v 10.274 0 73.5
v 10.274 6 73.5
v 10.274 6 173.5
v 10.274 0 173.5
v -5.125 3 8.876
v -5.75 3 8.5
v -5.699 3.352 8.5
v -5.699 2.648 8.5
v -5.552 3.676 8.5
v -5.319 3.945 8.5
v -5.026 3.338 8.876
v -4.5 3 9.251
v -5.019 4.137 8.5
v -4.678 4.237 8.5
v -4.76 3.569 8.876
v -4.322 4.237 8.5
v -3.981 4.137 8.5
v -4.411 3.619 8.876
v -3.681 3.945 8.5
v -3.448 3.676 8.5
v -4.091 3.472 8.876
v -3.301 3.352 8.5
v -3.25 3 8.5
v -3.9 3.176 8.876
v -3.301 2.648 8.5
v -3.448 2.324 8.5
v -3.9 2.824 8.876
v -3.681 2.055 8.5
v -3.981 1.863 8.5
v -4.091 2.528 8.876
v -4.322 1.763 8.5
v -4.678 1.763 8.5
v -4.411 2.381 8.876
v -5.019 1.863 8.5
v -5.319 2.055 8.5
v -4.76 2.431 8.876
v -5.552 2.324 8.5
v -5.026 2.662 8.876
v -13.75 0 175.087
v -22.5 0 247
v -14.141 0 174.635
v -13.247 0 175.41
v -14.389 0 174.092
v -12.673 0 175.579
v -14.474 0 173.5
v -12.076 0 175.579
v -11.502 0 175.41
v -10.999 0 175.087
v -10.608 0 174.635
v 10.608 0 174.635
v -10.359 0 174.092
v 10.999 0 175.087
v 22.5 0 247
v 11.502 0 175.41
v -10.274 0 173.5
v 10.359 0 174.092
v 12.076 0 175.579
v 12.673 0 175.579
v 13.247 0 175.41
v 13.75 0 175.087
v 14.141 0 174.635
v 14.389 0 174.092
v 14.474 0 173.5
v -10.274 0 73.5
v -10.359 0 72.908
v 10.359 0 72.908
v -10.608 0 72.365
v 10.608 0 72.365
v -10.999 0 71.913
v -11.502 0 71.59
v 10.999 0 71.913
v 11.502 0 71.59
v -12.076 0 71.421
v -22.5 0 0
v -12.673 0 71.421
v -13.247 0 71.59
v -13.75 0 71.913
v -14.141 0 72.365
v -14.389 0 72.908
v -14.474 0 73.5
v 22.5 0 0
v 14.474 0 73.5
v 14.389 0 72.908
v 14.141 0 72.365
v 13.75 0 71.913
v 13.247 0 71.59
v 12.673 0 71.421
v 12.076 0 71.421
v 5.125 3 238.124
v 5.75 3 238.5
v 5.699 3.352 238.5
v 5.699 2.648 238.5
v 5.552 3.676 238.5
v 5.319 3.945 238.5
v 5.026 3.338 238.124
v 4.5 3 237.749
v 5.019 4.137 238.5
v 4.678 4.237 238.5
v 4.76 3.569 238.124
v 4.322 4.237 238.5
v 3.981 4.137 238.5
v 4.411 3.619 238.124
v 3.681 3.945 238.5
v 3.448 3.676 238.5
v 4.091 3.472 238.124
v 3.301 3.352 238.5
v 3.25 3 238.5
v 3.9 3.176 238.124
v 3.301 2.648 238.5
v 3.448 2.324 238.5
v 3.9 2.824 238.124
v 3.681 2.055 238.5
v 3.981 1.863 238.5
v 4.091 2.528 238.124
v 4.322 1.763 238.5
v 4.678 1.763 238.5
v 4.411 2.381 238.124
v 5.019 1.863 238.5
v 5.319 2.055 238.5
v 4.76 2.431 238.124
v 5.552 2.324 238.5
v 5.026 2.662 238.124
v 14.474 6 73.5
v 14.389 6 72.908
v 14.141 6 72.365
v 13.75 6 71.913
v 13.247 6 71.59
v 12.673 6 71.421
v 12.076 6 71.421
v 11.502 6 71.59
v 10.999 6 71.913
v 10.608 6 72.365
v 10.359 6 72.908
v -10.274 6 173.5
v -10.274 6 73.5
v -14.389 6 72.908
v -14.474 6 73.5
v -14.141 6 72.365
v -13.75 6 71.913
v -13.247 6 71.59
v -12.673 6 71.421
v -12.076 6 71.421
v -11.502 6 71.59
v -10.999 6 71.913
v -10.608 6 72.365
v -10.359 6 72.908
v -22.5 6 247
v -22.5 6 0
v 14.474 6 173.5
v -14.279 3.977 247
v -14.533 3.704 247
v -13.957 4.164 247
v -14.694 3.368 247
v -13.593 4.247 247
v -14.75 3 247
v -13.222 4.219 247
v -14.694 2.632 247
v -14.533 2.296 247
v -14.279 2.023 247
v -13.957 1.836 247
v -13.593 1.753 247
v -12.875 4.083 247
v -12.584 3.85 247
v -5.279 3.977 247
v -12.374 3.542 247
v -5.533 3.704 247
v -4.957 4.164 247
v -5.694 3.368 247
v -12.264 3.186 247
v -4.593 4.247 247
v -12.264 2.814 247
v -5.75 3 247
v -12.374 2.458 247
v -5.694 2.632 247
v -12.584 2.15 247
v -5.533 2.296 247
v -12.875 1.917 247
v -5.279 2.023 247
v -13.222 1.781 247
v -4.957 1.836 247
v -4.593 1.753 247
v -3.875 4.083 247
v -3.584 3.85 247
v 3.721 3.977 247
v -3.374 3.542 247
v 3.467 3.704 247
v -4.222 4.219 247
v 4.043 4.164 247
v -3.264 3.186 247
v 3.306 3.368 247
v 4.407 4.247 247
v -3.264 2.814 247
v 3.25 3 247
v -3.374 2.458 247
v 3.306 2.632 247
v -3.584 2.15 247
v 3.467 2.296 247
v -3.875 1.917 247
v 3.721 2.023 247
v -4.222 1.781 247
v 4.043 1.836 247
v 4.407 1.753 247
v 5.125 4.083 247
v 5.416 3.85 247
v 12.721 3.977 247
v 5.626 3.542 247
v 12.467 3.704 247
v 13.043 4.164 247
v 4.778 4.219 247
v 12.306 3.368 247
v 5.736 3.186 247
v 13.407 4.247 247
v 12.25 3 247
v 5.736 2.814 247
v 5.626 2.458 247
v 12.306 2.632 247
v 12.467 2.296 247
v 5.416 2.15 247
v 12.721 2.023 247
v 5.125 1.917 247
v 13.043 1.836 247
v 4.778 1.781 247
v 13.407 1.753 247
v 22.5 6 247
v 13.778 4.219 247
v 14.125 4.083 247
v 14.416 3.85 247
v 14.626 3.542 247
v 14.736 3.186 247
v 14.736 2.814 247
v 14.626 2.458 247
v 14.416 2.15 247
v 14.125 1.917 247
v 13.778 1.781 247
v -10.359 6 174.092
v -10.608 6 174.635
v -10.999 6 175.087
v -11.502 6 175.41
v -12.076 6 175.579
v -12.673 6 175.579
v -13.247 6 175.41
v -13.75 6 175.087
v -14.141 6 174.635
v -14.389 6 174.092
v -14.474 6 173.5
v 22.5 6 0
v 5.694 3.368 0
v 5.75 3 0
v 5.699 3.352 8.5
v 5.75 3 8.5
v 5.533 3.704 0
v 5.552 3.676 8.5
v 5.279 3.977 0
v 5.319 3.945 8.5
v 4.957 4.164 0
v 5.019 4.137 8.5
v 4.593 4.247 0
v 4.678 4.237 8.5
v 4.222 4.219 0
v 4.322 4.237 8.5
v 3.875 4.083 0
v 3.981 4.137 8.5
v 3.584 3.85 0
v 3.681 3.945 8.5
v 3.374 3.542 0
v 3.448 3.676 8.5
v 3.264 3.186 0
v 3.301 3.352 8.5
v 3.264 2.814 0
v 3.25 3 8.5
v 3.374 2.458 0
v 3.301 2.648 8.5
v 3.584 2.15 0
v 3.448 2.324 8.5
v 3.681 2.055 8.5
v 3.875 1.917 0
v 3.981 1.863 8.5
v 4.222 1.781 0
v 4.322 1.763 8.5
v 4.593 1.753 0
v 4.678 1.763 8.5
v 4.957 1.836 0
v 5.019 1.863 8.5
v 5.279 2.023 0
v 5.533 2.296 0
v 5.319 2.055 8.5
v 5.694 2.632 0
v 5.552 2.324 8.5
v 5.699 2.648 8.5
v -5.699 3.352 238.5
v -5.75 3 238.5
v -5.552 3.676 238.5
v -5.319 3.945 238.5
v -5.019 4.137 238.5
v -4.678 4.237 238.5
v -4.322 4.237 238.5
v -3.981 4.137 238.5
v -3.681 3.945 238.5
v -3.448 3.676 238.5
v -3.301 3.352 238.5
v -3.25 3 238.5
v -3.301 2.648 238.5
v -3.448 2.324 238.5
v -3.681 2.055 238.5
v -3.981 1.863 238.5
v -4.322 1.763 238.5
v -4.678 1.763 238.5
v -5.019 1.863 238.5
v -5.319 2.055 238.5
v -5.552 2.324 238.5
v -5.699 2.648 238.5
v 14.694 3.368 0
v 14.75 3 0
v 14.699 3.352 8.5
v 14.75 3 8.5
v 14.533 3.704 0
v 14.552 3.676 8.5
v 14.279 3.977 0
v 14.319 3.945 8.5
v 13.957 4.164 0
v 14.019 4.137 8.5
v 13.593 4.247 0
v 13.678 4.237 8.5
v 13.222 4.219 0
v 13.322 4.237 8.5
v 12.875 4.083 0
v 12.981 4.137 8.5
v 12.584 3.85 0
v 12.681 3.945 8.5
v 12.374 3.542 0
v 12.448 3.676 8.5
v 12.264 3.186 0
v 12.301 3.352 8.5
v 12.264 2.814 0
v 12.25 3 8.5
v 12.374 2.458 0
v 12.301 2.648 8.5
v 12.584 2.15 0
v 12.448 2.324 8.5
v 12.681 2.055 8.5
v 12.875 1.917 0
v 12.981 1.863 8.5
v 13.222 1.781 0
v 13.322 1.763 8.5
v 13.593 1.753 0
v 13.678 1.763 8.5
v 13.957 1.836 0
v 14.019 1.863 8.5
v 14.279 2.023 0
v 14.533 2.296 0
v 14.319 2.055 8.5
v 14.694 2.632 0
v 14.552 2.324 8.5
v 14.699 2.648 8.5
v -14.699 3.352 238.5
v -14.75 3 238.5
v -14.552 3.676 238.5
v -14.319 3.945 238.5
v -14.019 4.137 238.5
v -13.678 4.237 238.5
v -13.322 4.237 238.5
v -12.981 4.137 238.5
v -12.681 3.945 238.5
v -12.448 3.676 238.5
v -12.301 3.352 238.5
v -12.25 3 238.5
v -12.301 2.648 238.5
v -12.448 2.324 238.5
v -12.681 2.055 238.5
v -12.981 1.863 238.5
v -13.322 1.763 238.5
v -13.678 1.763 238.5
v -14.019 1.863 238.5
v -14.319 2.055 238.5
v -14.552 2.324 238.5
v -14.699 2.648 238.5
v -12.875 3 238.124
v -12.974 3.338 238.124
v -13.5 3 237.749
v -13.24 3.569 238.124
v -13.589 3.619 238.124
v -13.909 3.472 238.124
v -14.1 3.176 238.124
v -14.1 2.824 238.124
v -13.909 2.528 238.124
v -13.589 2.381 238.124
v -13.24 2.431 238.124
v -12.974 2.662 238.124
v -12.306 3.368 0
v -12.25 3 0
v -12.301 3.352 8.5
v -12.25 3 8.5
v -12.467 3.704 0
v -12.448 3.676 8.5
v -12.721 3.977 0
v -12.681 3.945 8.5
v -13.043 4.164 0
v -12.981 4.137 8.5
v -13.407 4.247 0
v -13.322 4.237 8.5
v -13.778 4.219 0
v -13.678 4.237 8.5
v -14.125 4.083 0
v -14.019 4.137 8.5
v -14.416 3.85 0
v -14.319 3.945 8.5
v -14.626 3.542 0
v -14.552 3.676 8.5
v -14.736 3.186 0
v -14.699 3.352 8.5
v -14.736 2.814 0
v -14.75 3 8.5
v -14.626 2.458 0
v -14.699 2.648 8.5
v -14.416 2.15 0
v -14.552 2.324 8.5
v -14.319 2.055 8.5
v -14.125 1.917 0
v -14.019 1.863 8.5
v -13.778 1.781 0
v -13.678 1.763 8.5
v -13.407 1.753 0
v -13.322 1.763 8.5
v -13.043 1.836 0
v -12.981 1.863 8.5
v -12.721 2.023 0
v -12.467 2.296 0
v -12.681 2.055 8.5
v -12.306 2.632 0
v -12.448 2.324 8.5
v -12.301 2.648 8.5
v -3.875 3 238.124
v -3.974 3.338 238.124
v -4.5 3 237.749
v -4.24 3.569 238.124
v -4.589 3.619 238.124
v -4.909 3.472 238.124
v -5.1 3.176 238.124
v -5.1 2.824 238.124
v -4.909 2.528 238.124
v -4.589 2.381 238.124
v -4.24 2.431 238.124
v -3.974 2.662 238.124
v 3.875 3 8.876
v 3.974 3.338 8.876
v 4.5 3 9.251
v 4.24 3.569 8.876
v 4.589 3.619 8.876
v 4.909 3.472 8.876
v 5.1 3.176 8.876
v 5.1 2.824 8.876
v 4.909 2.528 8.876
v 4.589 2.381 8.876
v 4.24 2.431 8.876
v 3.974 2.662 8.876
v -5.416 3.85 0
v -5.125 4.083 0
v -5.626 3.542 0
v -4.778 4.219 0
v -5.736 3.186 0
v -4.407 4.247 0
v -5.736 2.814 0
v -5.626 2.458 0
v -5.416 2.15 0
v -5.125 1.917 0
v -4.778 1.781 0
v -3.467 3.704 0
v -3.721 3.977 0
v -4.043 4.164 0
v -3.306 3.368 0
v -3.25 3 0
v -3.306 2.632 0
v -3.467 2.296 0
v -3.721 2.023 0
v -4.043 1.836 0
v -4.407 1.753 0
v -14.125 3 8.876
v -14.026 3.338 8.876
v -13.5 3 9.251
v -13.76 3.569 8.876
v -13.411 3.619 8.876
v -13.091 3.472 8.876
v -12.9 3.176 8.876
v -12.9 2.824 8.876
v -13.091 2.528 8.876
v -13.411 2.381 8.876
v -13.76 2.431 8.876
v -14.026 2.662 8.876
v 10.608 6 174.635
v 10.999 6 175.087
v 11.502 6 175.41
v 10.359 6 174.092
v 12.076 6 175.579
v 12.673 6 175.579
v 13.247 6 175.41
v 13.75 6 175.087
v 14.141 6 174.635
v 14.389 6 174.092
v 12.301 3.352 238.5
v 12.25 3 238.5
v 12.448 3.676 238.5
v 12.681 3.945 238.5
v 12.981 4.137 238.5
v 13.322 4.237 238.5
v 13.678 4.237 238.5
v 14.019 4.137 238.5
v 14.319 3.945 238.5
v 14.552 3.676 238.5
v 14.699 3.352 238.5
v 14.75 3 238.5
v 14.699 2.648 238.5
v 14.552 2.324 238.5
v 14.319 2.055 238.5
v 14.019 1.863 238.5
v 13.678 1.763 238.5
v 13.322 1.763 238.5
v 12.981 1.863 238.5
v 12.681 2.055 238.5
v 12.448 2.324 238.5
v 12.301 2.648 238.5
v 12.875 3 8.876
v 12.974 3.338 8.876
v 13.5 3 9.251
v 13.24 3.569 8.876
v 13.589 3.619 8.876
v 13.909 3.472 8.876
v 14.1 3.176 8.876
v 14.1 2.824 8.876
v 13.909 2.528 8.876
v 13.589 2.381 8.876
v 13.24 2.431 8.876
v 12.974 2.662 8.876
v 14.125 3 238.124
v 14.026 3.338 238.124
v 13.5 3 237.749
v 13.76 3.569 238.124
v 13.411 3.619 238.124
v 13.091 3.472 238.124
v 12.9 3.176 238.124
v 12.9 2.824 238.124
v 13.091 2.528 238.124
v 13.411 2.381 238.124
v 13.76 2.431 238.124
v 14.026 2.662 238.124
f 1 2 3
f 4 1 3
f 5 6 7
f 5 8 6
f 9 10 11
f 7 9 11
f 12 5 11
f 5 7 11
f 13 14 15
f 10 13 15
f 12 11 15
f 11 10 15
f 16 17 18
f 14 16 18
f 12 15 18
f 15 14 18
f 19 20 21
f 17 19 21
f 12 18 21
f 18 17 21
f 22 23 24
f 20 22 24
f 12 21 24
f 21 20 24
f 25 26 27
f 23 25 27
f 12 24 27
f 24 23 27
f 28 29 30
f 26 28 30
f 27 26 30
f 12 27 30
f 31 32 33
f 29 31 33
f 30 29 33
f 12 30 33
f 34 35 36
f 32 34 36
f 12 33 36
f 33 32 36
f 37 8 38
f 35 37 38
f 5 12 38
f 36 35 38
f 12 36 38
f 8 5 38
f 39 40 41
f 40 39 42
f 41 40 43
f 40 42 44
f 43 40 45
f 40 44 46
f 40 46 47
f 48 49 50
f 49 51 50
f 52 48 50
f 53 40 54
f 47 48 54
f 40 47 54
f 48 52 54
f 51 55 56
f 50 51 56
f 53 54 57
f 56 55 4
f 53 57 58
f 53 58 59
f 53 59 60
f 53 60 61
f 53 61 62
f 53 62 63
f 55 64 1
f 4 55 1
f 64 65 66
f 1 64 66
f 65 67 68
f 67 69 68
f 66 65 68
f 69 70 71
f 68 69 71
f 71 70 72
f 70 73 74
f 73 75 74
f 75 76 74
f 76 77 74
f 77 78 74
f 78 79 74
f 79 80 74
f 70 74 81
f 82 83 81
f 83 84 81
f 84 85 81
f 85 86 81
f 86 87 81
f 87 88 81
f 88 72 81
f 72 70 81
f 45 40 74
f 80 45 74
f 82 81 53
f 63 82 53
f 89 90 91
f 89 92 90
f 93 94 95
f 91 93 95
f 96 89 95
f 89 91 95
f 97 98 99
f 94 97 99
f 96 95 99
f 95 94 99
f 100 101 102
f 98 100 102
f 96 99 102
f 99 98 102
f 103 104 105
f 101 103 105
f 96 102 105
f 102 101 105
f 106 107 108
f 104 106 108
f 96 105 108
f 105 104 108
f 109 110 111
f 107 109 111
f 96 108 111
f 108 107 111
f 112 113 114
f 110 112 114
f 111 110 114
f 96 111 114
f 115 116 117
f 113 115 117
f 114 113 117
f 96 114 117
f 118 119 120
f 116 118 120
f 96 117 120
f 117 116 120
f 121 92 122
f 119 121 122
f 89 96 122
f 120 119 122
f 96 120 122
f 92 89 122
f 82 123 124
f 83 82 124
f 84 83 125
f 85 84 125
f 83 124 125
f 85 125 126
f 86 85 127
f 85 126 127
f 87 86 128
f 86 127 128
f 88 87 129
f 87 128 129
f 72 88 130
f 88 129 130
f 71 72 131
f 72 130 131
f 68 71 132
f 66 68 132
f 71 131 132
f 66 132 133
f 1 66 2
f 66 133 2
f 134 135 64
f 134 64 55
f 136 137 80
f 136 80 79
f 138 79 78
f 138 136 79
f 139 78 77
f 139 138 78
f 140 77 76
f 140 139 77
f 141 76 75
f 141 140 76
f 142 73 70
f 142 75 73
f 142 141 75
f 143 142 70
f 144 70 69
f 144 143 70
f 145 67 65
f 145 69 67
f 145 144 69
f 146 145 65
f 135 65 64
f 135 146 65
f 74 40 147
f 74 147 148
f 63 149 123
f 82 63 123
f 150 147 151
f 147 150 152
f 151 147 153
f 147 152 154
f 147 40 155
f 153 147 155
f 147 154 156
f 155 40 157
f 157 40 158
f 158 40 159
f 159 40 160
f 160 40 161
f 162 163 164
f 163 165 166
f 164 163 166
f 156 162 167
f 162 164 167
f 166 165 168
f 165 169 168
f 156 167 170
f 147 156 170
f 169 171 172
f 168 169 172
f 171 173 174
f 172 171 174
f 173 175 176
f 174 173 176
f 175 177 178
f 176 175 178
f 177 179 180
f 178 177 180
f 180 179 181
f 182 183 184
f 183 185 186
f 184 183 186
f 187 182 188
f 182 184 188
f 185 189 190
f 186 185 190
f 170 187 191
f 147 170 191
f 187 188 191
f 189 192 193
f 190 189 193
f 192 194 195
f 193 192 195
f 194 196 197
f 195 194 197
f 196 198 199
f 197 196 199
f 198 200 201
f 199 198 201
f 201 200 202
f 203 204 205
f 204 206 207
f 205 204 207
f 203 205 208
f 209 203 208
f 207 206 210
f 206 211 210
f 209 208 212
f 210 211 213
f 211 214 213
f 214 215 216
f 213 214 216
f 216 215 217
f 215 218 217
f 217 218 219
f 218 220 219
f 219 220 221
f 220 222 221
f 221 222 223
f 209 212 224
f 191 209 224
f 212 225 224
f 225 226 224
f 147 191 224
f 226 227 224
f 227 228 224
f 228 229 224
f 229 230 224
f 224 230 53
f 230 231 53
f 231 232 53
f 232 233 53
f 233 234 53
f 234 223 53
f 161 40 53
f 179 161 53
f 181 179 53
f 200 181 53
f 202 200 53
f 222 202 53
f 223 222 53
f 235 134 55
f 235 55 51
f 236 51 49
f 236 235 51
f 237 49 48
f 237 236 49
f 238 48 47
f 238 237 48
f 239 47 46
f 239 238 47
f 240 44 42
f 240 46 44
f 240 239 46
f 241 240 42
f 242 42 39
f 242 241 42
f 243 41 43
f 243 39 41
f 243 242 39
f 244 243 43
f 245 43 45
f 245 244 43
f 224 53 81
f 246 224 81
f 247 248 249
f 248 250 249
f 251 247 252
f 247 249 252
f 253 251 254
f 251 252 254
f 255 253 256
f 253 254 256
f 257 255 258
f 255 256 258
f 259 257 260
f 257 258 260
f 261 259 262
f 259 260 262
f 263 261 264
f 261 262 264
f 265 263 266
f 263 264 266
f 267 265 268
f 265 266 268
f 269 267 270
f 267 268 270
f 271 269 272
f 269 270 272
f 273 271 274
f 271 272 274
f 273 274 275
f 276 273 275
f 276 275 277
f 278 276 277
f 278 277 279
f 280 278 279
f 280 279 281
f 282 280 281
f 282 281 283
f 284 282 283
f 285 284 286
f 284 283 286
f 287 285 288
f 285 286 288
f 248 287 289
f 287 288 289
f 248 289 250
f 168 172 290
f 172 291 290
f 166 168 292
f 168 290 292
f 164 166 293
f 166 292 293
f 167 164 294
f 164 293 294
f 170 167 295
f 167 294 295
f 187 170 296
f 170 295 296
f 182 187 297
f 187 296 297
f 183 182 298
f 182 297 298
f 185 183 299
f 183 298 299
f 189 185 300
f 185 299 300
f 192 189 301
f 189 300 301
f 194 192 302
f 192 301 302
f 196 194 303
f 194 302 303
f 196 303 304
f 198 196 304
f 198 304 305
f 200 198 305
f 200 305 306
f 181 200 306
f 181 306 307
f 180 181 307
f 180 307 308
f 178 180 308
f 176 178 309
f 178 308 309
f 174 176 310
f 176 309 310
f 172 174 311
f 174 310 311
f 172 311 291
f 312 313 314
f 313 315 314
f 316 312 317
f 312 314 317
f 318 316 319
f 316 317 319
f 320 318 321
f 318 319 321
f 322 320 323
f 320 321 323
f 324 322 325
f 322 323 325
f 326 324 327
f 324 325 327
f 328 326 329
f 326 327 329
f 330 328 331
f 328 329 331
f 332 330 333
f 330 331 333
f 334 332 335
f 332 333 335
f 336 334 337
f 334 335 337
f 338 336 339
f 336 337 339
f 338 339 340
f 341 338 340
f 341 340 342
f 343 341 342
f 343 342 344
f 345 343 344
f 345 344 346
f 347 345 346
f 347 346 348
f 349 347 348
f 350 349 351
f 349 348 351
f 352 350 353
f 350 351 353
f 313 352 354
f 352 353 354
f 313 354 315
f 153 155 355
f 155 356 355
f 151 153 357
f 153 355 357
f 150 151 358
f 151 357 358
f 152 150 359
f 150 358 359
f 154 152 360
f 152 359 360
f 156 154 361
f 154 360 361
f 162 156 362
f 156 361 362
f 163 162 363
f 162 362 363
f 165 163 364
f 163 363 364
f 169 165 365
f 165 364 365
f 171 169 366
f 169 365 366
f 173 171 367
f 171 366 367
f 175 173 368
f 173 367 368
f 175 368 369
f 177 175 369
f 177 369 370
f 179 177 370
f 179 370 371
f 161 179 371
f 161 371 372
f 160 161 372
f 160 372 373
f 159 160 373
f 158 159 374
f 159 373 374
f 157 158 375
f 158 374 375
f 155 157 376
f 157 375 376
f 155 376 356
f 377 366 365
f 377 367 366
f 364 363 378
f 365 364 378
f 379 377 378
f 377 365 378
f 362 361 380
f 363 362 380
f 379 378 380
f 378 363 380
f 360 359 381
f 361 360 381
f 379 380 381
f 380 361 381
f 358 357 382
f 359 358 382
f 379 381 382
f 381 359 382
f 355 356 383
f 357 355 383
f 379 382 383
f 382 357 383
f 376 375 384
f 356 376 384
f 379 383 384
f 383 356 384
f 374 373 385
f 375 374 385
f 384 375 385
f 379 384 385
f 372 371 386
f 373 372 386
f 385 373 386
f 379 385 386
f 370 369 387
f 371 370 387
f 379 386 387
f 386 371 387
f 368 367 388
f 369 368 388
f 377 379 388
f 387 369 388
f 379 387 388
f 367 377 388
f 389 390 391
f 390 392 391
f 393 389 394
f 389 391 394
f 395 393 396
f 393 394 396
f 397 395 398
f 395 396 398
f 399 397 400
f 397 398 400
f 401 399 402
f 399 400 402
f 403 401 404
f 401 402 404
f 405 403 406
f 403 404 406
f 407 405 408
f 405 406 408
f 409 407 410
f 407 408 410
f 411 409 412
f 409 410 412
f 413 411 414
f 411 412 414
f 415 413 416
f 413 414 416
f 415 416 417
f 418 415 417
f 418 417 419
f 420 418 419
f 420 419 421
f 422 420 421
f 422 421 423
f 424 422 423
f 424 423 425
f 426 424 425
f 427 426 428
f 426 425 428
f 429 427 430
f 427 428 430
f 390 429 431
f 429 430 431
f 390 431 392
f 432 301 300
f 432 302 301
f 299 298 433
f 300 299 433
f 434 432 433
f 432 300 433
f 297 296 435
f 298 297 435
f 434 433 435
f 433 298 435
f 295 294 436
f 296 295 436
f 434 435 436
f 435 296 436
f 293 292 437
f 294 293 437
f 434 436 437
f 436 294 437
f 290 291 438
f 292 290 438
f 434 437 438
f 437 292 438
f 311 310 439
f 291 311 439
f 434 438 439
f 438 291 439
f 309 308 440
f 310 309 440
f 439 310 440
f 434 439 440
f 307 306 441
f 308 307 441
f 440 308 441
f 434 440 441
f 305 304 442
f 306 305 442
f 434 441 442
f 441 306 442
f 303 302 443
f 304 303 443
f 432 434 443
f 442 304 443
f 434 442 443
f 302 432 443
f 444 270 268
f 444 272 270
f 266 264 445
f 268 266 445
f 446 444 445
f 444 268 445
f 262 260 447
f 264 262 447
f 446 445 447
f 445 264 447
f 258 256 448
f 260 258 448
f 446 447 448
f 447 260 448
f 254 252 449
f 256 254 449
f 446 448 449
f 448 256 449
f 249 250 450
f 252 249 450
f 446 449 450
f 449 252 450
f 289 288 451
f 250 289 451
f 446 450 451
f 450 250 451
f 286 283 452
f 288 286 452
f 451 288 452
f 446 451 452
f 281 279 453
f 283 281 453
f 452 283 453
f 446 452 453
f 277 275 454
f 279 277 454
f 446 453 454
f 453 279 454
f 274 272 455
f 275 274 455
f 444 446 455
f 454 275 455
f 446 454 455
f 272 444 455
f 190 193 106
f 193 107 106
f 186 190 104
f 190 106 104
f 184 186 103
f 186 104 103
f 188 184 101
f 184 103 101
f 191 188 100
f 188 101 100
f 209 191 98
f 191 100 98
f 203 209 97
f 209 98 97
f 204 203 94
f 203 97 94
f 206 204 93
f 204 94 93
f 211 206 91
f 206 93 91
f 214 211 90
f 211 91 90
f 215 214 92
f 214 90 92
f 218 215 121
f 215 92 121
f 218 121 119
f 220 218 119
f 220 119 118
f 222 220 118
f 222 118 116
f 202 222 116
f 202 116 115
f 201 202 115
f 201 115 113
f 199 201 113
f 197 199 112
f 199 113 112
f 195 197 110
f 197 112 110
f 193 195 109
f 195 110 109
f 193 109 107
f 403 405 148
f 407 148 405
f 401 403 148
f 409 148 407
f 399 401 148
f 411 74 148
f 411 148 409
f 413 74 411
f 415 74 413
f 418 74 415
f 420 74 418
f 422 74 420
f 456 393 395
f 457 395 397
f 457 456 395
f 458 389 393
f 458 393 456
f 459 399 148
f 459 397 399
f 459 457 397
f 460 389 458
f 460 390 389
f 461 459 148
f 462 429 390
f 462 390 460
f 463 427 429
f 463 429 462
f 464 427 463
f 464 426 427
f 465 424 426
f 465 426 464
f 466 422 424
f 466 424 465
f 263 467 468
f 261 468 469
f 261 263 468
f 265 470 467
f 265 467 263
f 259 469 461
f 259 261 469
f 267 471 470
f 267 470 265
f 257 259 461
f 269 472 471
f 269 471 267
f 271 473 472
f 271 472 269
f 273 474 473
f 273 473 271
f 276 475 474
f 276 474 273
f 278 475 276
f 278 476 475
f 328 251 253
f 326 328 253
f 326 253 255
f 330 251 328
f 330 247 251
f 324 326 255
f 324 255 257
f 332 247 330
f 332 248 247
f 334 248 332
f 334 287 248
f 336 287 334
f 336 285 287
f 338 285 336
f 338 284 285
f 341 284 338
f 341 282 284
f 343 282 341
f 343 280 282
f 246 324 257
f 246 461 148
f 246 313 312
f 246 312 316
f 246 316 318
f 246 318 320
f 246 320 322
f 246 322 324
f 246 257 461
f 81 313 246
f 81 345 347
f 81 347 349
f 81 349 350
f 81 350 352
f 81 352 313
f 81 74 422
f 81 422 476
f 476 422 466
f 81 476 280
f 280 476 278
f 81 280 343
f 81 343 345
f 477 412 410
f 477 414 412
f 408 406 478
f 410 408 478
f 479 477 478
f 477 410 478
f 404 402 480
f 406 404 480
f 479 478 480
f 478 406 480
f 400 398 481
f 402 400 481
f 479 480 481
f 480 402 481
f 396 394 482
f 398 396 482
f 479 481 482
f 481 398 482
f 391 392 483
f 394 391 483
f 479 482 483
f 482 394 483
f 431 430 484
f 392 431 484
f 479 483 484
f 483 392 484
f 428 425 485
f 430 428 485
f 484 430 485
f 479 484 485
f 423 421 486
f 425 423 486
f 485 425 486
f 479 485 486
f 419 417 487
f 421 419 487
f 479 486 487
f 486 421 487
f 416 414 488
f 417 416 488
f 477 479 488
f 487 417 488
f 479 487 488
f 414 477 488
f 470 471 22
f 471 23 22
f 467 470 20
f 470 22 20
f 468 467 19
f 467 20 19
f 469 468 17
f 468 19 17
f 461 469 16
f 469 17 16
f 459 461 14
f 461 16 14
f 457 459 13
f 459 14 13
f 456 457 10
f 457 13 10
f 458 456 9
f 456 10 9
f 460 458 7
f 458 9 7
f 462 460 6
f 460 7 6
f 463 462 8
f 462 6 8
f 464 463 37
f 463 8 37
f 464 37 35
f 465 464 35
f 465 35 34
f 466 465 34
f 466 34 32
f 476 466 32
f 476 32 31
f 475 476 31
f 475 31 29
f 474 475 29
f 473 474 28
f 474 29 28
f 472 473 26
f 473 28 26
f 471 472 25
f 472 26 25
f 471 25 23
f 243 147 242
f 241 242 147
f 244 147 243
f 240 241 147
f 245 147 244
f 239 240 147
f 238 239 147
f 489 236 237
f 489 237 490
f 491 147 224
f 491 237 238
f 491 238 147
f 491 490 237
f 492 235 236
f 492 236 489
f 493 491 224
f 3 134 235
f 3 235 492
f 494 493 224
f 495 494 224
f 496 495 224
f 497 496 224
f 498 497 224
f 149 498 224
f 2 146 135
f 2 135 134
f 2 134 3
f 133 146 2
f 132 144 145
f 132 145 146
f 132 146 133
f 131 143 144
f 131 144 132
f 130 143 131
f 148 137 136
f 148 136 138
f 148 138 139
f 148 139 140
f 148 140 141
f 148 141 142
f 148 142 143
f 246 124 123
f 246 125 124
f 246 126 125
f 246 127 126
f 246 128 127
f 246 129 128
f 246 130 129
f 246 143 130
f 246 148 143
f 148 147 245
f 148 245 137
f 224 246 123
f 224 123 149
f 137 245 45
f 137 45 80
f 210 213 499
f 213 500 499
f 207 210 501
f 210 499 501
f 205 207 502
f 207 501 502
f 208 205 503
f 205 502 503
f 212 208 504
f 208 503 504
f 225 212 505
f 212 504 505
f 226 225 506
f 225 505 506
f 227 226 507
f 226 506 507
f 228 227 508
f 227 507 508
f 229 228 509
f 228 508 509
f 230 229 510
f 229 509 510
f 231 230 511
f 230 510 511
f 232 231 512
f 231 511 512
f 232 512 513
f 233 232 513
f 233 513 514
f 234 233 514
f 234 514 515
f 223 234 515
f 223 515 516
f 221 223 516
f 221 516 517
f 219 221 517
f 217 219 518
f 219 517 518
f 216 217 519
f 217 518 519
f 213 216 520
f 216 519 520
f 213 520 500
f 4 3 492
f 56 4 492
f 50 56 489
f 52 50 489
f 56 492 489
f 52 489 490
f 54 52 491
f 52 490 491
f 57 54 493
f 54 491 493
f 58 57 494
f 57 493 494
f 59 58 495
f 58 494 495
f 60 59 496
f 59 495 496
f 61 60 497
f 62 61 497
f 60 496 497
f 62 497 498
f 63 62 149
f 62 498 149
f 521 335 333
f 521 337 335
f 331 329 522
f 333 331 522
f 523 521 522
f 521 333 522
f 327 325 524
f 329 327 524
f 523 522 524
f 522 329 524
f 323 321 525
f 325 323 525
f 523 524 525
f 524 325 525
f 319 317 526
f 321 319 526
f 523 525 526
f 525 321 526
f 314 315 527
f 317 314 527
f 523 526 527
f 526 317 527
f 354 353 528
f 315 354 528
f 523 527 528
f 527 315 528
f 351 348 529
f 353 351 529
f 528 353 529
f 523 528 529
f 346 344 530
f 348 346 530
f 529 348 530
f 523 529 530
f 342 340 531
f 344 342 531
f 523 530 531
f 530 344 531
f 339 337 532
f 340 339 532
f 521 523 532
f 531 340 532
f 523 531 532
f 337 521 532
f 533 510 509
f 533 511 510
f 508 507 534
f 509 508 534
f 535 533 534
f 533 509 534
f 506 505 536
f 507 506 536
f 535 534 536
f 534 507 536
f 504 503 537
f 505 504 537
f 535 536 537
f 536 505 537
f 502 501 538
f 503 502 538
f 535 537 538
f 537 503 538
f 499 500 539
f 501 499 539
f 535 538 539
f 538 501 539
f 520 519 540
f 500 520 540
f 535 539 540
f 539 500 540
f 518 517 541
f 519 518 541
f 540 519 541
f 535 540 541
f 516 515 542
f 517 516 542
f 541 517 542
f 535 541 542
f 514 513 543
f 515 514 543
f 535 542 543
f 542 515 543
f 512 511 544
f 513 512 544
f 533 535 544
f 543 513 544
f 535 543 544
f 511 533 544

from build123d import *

# Parameters (mm, degrees)
SKETCH_1_W          = 45
SKETCH_1_H          = 247
EXTRUDE_1_DEPTH     = 6
CUT_EXTRUDE_1_DEPTH = 249.095243808
M3X0_51_D           = 2.5
M3X0_51_DEPTH       = 8.5
M3X0_51_TIP         = 0.751075774
M3X0_52_D           = 2.5
M3X0_52_DEPTH       = 8.5
M3X0_52_TIP         = 0.751075774


with BuildPart() as part:
    # Эскиз1 → Бобышка-Вытянуть1 (new body)
    with BuildSketch(Plane(origin=(0, 0, 0), x_dir=(1, 0, 0), z_dir=(0, 1, 0))):
        with Locations((0, -123.5)):
            Rectangle(SKETCH_1_W, SKETCH_1_H)
    extrude(amount=EXTRUDE_1_DEPTH)

    # Эскиз2 → Вырез-Вытянуть1 (cut, through all)
    with BuildSketch(Plane(origin=(0, 6, 0), x_dir=(1, 0, 0), z_dir=(0, 1, 0))):
        with BuildLine():
            Line((-10.274368671, -73.5), (-10.274368671, -173.5))
            ThreePointArc((-10.274368671, -173.5), (-12.374368671, -175.6), (-14.474368671, -173.5))
            Line((-14.474368671, -173.5), (-14.474368671, -73.5))
            ThreePointArc((-14.474368671, -73.5), (-12.374368671, -71.4), (-10.274368671, -73.5))
        make_face()
        with BuildLine():
            Line((10.274368671, -73.5), (10.274368671, -173.5))
            ThreePointArc((10.274368671, -173.5), (12.374368671, -175.6), (14.474368671, -173.5))
            Line((14.474368671, -173.5), (14.474368671, -73.5))
            ThreePointArc((14.474368671, -73.5), (12.374368671, -71.4), (10.274368671, -73.5))
        make_face()
    extrude(amount=-CUT_EXTRUDE_1_DEPTH, mode=Mode.SUBTRACT)

    # Отверстие обработанное метчиком M3x0.51
    with Locations(Plane.XY.offset(247)):
        with Locations((-13.5, 3), (-4.5, 3), (4.5, 3), (13.5, 3)):
            Hole(M3X0_51_D / 2, depth=M3X0_51_DEPTH)
            with Locations((0, 0, -(M3X0_51_DEPTH + M3X0_51_TIP / 2))):  # 118° drill point
                Cone(0, M3X0_51_D / 2, M3X0_51_TIP, mode=Mode.SUBTRACT)

    # Отверстие обработанное метчиком M3x0.52
    with Locations(Plane(origin=(0, 0, 0), x_dir=(-1, 0, 0), z_dir=(0, 0, -1))):
        with Locations((-13.5, 3), (-4.5, 3), (4.5, 3), (13.5, 3)):
            Hole(M3X0_52_D / 2, depth=M3X0_52_DEPTH)
            with Locations((0, 0, -(M3X0_52_DEPTH + M3X0_52_TIP / 2))):  # 118° drill point
                Cone(0, M3X0_52_D / 2, M3X0_52_TIP, mode=Mode.SUBTRACT)


solid = part.part
